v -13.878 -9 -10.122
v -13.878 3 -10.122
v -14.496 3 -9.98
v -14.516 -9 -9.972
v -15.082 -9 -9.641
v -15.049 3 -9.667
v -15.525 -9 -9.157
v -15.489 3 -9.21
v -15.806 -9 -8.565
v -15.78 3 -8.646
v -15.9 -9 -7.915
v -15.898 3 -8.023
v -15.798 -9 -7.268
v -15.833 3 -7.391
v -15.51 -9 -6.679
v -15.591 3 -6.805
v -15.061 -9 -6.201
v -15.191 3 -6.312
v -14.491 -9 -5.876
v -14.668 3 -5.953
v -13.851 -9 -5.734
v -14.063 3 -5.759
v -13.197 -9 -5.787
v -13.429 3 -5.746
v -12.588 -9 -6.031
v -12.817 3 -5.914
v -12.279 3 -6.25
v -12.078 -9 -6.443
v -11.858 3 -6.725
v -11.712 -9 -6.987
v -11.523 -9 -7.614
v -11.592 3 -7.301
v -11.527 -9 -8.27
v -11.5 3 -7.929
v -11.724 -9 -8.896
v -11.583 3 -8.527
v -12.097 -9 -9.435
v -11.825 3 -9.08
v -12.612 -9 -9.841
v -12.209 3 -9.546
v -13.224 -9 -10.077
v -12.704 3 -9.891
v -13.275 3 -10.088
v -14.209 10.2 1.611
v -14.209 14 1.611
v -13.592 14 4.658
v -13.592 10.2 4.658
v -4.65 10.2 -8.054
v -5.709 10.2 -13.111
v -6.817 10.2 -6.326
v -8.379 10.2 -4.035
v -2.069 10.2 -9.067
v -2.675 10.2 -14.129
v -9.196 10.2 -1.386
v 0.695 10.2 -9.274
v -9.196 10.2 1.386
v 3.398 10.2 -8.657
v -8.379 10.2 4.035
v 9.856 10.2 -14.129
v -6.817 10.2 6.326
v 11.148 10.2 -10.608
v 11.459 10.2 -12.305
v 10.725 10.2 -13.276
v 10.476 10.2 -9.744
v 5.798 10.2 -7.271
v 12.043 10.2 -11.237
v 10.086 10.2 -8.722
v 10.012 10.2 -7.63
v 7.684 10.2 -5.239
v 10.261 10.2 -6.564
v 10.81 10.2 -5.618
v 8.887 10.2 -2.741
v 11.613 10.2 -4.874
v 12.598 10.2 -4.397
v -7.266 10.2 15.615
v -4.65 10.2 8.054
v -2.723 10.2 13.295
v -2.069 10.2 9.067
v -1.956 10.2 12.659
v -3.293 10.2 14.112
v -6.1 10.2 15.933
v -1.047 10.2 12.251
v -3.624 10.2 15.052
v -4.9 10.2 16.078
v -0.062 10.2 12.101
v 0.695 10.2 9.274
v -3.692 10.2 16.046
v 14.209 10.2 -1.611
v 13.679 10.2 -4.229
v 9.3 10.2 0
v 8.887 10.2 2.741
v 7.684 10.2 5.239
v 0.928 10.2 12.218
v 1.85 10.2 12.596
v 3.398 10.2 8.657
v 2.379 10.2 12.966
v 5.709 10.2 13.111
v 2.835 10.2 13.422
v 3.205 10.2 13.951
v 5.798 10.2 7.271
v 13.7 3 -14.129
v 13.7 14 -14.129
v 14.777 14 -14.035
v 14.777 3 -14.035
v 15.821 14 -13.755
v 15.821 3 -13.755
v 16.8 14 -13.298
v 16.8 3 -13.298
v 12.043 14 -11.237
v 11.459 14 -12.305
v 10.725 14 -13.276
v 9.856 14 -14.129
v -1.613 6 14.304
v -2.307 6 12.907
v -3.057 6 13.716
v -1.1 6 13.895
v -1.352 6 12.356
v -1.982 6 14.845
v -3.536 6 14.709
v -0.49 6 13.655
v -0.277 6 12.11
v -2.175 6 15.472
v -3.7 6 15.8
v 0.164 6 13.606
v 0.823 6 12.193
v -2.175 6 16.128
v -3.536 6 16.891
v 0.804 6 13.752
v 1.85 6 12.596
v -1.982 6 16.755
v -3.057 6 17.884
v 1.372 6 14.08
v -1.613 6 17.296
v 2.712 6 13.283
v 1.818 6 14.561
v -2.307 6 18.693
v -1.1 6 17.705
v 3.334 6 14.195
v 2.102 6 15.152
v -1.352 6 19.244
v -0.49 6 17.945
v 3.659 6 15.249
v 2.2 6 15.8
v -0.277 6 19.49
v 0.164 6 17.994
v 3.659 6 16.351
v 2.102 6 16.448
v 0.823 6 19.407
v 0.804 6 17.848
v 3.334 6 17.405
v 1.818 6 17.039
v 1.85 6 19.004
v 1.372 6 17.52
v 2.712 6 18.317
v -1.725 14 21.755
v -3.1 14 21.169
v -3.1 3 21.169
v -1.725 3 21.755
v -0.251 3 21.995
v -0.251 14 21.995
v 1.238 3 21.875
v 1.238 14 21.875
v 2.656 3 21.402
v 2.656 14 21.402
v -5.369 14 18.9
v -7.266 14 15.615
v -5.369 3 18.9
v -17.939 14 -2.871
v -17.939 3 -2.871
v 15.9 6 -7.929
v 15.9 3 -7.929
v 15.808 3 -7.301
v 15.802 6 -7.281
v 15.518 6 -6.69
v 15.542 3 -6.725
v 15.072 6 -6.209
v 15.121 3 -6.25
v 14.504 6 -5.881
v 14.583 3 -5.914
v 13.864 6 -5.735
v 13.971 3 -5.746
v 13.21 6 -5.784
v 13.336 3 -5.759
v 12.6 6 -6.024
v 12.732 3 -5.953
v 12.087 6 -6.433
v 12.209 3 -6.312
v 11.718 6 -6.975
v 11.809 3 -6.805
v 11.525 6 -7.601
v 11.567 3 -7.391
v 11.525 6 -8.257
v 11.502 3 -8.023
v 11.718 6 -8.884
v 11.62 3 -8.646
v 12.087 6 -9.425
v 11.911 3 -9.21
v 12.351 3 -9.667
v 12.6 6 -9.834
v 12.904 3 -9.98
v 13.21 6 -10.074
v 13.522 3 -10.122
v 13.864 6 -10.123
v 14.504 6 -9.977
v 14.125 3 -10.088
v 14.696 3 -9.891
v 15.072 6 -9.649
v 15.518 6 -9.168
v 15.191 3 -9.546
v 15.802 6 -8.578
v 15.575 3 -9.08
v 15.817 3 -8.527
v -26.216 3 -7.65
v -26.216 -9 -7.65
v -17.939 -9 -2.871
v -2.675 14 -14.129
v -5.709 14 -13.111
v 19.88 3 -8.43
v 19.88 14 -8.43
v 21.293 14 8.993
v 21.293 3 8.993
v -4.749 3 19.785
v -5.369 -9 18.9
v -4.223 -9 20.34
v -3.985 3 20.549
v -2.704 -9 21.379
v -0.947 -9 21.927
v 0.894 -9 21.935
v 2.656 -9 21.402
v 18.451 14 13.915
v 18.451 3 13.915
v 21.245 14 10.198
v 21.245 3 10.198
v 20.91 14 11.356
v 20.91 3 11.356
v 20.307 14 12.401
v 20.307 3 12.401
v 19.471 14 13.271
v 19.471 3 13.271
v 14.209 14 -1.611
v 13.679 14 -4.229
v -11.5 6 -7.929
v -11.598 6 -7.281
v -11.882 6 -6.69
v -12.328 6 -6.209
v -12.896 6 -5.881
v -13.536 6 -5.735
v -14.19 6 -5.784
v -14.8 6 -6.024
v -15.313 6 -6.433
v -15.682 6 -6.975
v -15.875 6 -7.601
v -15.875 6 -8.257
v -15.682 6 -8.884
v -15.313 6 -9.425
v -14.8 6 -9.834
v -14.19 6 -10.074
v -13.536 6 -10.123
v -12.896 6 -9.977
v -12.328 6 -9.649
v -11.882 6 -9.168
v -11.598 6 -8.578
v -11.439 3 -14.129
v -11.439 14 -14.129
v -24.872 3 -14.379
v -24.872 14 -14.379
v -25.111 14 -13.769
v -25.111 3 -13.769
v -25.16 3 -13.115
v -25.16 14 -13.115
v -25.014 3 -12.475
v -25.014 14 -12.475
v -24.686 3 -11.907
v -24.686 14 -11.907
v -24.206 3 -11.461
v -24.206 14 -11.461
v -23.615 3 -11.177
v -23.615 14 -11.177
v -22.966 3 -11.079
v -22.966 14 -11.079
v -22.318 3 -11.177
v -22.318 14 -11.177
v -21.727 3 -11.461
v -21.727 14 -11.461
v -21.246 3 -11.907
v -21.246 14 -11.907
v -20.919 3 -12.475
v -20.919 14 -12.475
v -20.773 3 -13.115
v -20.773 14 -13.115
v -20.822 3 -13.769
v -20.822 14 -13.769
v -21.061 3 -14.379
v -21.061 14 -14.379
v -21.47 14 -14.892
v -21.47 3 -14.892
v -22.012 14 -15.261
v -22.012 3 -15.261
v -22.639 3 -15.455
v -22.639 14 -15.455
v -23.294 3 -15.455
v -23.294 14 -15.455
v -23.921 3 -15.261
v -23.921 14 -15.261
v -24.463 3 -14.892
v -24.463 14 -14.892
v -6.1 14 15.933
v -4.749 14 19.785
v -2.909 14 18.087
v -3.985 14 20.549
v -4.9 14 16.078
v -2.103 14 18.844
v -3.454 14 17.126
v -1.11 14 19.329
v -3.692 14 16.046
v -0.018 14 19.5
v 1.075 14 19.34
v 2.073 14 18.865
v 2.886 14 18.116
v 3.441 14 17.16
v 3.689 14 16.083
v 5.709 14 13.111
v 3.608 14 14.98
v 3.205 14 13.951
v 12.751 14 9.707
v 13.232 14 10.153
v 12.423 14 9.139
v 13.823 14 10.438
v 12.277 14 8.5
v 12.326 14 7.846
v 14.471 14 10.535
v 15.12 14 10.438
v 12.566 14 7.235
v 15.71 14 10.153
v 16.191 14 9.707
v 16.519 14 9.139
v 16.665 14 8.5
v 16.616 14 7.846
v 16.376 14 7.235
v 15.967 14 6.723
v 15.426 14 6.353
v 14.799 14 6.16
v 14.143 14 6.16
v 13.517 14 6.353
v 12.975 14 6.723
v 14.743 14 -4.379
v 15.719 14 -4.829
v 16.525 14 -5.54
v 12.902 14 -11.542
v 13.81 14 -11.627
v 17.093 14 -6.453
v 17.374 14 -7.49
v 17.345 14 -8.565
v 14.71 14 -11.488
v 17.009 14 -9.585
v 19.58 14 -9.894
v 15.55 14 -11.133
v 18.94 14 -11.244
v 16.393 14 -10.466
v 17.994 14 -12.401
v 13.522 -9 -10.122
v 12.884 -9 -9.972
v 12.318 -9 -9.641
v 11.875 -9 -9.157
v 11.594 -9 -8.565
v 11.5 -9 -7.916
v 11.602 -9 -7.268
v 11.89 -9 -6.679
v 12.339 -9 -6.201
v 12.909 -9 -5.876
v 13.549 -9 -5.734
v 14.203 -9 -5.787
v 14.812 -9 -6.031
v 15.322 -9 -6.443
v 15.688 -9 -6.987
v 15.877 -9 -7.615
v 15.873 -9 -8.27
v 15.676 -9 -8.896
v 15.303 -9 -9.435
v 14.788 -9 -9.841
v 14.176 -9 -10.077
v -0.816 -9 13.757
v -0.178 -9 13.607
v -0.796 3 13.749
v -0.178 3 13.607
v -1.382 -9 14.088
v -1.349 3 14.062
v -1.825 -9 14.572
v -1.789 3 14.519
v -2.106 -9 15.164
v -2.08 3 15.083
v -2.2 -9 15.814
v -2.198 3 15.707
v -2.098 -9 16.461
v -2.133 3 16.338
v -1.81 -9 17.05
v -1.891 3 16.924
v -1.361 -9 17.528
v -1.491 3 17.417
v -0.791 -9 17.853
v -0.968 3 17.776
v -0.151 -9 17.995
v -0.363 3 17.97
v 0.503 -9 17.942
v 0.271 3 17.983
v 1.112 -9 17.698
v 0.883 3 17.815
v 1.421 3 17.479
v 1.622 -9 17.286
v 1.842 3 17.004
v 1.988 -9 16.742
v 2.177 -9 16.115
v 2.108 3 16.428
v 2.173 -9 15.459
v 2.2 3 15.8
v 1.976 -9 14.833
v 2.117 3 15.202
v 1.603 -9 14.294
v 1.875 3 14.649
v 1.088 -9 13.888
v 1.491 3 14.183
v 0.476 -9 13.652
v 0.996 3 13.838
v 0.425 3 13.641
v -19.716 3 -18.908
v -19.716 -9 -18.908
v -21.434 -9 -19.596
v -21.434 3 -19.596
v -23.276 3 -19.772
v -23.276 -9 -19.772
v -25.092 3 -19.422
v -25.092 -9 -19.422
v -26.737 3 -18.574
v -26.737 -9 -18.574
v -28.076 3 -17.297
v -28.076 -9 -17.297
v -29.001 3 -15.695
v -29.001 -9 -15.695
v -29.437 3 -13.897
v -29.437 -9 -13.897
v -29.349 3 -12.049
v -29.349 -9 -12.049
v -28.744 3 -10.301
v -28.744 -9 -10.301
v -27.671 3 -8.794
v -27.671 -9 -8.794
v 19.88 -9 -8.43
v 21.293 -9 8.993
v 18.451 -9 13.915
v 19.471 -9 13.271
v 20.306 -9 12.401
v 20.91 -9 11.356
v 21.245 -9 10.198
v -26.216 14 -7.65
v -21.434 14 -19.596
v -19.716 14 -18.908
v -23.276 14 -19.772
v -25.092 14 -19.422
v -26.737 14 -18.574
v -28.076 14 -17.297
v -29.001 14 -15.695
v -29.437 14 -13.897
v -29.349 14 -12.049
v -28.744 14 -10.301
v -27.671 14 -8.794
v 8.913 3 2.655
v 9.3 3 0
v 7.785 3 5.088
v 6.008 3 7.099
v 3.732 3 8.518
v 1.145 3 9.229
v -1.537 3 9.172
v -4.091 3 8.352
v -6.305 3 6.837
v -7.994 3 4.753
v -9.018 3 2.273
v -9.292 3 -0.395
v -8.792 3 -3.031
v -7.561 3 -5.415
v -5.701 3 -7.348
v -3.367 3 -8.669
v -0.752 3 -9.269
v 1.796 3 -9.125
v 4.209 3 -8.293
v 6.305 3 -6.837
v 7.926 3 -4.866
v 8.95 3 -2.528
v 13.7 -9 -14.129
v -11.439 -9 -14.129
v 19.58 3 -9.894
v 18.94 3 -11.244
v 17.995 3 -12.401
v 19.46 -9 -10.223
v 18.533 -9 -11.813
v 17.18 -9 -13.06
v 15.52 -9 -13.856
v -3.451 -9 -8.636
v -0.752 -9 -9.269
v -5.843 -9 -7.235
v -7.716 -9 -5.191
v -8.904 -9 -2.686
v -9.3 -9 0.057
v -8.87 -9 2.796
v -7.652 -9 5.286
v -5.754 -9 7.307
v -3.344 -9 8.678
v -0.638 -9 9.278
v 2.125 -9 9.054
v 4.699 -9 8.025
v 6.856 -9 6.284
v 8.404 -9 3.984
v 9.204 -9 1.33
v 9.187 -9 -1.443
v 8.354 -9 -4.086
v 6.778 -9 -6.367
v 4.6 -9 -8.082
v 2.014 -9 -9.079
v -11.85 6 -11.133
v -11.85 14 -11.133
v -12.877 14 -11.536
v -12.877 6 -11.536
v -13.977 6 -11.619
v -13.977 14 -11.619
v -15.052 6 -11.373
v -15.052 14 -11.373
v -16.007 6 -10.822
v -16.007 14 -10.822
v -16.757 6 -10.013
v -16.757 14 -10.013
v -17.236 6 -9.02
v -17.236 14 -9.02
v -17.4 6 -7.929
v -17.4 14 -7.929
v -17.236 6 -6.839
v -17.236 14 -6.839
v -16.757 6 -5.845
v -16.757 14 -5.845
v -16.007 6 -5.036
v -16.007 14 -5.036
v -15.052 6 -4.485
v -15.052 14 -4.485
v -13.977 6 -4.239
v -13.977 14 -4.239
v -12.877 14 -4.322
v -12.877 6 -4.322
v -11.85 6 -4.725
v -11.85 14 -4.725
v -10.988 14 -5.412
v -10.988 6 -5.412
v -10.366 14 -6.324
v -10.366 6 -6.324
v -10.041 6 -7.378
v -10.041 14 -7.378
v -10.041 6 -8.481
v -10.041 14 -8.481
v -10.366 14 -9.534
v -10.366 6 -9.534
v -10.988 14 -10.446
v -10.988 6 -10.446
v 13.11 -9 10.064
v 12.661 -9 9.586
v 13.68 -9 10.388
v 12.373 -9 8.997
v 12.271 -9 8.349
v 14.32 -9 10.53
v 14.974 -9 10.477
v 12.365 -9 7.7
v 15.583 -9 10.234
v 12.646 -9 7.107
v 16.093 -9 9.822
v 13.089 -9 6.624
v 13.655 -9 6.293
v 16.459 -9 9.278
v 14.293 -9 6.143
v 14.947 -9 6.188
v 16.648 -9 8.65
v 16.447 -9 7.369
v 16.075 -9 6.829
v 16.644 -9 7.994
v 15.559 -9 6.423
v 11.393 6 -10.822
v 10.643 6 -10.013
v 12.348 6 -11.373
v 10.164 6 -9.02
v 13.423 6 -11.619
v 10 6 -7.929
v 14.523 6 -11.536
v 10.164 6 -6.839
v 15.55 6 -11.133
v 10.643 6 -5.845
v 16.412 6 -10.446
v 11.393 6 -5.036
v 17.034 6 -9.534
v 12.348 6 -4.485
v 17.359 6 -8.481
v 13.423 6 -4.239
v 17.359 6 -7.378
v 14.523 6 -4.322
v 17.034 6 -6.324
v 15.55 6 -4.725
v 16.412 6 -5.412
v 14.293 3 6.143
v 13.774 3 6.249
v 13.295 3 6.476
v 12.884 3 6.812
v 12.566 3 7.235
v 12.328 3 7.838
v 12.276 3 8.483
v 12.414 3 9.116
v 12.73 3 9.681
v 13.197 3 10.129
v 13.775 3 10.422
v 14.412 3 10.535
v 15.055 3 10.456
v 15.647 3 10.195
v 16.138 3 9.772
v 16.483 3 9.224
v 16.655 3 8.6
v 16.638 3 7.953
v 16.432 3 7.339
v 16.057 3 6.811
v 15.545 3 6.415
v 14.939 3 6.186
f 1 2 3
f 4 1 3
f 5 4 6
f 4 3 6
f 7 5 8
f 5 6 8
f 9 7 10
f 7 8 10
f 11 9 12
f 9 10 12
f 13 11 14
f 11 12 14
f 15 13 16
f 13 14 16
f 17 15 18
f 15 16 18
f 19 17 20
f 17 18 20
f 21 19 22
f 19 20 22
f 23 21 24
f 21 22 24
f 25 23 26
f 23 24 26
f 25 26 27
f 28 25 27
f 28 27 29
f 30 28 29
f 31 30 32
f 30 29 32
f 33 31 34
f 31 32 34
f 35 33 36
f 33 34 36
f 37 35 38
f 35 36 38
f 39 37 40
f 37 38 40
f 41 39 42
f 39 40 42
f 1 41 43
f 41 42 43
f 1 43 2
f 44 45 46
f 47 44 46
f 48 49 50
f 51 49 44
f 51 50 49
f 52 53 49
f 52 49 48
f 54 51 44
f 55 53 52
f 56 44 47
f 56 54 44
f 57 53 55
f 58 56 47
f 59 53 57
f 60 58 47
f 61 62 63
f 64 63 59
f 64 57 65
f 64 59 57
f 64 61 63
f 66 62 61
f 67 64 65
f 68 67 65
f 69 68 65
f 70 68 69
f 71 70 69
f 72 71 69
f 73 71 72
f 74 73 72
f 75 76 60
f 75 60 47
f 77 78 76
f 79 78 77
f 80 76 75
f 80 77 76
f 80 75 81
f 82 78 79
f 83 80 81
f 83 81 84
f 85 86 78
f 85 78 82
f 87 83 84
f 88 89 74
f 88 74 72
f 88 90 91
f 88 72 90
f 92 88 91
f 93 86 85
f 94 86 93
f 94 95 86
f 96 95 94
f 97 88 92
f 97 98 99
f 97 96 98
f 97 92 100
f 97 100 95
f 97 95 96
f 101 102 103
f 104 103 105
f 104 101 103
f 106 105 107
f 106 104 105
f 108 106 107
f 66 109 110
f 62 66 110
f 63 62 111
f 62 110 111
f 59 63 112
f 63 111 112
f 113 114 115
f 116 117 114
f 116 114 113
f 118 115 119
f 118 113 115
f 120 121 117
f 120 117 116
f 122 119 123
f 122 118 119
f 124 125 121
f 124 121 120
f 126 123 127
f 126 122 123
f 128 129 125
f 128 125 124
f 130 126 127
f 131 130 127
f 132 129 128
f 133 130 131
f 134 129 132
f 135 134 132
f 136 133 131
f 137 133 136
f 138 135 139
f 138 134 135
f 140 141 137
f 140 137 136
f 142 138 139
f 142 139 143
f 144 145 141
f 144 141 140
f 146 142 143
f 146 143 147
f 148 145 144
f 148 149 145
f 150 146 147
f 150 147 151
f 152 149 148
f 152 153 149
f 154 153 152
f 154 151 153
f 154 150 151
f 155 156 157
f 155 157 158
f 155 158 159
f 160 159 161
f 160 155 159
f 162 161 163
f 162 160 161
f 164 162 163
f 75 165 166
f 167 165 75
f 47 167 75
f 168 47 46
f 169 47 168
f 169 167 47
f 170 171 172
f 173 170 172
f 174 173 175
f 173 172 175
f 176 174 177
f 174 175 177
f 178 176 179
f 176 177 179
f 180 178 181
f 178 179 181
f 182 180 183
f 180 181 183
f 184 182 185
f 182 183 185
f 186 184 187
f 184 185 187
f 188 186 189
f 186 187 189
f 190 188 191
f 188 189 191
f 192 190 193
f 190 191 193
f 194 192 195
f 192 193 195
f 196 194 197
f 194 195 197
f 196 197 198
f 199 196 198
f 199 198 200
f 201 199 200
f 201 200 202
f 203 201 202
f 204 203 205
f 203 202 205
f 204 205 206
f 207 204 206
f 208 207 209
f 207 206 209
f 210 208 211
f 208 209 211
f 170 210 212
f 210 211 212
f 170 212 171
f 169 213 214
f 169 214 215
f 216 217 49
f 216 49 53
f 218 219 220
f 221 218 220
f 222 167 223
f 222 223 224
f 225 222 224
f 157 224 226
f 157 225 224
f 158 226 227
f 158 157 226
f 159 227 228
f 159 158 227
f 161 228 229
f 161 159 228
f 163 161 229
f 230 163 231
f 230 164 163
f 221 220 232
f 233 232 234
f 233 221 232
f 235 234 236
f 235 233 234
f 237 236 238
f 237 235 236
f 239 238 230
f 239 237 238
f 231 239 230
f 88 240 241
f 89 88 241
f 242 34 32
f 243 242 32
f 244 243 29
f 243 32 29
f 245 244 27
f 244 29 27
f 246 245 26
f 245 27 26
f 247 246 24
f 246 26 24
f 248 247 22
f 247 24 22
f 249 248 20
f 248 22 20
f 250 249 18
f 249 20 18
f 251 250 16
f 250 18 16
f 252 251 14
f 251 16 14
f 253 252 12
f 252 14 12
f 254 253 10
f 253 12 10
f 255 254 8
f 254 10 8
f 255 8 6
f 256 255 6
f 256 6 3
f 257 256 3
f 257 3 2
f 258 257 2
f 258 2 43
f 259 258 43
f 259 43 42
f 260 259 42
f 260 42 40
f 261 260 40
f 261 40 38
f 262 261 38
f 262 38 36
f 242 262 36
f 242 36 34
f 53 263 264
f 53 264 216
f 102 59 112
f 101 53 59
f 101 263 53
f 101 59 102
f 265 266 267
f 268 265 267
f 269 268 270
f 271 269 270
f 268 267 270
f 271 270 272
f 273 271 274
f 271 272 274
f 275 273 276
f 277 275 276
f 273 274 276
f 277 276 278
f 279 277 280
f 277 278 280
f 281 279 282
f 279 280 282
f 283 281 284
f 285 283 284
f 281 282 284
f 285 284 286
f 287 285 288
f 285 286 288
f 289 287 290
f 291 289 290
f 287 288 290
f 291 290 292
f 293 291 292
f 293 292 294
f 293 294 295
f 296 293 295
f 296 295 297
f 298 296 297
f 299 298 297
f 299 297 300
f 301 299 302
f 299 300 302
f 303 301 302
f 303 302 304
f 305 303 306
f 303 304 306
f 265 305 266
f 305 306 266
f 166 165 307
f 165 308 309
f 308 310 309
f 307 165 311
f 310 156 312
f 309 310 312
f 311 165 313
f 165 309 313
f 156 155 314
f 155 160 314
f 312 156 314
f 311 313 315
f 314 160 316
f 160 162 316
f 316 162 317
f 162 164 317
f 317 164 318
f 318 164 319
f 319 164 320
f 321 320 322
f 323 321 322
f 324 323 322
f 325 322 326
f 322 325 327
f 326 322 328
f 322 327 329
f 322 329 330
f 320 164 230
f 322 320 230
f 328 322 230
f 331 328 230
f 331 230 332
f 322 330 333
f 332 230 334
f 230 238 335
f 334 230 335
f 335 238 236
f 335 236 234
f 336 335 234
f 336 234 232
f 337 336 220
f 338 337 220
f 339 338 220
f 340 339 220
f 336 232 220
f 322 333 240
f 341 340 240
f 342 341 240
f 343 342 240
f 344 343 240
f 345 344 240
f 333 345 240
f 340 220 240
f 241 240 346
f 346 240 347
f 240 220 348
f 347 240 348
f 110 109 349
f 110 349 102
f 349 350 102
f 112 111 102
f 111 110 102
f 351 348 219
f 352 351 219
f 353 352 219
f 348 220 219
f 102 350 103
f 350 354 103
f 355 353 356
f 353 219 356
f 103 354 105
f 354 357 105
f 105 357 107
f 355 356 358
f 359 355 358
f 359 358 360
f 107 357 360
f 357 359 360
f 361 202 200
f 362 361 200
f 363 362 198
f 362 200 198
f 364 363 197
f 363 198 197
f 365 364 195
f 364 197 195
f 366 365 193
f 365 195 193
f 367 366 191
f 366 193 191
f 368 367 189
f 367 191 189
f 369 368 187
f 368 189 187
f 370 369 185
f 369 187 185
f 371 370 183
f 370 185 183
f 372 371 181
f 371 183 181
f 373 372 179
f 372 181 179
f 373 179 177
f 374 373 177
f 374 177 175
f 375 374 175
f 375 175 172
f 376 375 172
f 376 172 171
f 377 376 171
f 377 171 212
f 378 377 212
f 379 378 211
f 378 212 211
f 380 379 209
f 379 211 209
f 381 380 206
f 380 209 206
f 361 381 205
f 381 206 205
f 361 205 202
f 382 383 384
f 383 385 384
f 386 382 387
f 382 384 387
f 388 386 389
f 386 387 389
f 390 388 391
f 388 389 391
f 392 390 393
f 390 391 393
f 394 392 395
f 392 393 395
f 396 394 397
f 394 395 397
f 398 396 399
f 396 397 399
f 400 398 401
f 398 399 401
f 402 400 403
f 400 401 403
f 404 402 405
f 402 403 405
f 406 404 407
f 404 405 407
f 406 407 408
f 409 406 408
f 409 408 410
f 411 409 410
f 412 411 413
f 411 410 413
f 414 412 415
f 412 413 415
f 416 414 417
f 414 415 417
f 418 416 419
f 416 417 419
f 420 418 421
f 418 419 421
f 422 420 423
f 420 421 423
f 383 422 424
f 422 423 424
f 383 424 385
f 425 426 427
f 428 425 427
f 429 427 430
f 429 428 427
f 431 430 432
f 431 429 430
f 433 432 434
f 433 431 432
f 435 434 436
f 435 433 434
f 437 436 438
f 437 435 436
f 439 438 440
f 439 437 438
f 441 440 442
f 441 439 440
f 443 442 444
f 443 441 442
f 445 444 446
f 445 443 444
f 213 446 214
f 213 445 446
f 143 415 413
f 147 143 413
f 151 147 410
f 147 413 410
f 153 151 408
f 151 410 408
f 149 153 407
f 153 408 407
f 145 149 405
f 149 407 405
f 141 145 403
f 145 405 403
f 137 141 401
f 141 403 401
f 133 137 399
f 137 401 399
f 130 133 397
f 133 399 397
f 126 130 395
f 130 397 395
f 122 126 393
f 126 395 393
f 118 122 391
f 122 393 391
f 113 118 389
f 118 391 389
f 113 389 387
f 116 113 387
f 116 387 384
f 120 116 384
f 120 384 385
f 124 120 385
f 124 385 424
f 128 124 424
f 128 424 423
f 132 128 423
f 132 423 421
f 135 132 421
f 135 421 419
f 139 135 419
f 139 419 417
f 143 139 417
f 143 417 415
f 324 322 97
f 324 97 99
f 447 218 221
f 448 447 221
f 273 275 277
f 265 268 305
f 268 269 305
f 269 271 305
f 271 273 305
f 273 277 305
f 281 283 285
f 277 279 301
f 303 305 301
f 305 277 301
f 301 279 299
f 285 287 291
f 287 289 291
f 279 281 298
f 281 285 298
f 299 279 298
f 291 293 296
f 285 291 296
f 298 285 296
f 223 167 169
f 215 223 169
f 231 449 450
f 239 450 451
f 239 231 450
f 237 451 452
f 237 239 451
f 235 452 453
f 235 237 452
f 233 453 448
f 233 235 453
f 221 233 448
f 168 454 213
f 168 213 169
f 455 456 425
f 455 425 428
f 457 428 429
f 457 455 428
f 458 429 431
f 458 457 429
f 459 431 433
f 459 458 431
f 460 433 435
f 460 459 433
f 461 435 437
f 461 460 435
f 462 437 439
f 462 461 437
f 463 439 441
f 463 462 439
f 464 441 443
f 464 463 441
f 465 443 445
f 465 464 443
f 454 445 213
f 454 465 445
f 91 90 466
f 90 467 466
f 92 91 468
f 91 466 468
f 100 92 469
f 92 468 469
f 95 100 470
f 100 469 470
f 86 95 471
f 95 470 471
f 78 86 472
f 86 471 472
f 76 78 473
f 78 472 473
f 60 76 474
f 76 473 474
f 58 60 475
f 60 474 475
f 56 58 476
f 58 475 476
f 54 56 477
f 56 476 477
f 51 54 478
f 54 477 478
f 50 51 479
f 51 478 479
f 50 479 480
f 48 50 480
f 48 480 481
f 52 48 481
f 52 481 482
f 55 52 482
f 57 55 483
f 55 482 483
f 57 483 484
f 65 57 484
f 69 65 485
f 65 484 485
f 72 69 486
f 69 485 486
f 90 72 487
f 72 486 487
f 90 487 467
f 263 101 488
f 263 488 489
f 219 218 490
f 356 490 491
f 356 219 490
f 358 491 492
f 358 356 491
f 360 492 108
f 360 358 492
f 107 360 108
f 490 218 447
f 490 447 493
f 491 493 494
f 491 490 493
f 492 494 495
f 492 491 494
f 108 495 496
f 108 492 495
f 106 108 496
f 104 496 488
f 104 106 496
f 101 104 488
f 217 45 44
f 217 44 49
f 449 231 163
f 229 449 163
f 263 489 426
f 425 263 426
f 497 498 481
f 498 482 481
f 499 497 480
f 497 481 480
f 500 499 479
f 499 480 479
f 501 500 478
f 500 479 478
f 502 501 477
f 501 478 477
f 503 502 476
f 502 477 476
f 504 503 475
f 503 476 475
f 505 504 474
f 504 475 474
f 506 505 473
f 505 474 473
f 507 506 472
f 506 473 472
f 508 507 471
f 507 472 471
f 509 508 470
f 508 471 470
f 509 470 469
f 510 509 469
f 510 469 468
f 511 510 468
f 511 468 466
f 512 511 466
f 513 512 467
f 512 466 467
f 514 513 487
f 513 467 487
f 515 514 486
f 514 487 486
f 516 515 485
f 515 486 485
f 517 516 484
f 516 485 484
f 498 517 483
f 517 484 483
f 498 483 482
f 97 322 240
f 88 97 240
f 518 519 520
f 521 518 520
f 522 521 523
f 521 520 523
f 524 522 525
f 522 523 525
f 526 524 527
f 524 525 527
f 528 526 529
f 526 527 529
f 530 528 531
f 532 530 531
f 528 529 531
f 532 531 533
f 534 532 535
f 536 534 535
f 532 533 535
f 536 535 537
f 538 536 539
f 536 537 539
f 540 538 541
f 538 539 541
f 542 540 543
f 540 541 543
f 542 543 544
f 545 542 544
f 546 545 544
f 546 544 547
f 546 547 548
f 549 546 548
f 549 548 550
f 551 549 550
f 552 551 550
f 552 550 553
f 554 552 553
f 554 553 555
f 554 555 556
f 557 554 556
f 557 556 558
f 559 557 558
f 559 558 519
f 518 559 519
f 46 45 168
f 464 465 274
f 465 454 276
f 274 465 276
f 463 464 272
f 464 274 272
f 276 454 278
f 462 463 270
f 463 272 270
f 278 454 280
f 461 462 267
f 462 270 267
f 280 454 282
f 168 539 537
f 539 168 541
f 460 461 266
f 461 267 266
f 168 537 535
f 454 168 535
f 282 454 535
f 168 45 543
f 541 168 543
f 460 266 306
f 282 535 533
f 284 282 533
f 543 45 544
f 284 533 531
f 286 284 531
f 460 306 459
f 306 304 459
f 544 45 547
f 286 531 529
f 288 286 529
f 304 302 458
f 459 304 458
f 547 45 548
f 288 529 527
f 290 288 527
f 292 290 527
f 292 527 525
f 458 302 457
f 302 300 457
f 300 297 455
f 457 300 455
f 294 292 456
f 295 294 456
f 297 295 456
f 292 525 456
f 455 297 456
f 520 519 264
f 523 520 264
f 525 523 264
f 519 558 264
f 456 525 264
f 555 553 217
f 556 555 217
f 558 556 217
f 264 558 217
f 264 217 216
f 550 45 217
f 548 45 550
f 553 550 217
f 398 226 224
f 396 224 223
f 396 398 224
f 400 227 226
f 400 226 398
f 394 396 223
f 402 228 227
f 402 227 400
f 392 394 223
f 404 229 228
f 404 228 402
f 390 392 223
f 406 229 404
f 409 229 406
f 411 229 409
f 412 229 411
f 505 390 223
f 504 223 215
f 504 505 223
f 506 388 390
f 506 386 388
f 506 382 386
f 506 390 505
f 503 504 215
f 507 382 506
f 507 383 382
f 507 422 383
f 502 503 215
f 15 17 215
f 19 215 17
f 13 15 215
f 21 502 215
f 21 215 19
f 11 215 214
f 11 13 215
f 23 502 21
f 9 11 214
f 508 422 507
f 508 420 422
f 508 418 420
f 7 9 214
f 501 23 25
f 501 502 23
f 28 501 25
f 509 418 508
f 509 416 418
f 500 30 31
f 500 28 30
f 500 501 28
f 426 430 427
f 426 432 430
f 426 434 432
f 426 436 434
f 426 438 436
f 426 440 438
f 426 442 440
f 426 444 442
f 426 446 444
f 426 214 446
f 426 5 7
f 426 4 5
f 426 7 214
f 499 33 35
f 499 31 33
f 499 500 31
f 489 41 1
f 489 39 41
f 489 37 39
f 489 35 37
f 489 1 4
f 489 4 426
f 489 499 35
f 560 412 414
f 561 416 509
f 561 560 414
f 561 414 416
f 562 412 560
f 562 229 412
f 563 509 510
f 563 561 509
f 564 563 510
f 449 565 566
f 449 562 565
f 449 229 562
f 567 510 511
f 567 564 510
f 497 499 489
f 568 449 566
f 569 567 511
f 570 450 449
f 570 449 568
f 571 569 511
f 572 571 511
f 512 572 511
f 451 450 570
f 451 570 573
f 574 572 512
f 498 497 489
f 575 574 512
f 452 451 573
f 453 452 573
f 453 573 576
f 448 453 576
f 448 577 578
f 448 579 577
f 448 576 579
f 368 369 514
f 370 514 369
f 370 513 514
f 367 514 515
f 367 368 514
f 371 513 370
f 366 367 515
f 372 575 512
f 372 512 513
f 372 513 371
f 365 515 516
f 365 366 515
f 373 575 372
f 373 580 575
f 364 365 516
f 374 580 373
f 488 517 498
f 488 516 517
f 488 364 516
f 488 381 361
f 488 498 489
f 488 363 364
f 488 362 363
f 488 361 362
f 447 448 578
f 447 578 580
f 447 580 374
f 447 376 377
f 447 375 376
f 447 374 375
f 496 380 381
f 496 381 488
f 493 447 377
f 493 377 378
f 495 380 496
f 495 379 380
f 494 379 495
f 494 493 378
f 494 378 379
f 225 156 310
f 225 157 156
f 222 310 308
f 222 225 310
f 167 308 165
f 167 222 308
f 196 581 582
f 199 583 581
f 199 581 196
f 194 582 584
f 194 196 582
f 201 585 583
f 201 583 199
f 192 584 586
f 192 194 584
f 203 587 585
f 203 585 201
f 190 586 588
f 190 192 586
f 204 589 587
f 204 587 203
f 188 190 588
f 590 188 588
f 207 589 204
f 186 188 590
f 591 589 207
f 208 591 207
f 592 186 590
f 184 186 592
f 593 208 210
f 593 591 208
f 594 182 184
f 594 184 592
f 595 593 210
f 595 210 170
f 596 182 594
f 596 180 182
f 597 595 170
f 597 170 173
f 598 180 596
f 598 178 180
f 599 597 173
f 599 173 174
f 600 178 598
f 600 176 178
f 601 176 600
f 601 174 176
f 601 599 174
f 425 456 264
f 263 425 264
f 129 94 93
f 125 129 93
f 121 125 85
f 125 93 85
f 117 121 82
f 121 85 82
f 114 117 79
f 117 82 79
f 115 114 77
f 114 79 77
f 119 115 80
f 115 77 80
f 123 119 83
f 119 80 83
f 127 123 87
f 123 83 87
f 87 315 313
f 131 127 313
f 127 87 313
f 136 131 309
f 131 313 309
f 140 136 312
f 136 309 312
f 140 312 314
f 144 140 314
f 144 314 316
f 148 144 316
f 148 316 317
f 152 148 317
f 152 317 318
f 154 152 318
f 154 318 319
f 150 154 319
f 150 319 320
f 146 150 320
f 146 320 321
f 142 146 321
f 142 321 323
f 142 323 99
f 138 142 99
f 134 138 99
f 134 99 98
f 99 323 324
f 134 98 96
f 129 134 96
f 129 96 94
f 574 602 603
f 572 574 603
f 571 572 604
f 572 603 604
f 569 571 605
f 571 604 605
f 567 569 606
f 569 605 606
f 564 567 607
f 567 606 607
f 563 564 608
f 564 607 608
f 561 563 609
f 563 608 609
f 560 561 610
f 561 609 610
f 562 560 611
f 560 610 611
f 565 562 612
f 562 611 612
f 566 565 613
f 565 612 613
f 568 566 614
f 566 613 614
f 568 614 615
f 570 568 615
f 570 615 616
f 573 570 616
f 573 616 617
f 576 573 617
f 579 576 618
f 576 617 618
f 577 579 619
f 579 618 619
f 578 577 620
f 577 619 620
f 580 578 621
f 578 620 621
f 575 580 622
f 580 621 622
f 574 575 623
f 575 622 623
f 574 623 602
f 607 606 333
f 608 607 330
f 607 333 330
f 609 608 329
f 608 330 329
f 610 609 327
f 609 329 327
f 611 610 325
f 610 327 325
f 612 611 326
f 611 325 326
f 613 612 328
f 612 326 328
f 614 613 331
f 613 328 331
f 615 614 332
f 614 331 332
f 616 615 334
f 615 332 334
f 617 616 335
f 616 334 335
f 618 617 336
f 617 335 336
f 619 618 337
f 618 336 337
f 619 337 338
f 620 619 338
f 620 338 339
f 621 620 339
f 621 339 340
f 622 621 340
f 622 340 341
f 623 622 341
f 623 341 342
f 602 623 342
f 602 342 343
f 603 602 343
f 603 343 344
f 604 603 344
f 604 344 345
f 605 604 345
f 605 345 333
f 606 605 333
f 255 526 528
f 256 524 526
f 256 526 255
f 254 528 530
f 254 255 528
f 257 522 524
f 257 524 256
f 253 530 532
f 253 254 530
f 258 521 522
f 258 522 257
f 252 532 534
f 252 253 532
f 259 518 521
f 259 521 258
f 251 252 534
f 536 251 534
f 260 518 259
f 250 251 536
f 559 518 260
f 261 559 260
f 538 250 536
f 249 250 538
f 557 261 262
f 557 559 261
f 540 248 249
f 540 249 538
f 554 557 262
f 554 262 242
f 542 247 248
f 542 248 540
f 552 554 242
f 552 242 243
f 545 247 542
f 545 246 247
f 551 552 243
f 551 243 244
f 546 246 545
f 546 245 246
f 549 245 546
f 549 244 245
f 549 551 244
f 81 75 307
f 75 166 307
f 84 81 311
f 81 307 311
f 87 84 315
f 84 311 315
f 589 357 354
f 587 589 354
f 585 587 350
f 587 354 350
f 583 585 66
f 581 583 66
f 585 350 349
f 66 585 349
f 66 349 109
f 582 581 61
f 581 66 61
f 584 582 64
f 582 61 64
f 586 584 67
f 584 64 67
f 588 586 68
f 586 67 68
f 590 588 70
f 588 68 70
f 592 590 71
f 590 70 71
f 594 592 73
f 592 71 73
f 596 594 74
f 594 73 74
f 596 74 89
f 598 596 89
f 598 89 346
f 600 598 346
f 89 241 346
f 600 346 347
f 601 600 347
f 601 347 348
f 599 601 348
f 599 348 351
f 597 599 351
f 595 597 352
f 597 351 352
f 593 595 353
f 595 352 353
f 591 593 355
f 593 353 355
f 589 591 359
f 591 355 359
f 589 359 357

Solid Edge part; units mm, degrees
sketch "Sketch1" plane through (0, 0, 0) normal (0, -1, 0) x (1, 0, 0)
  line L0 (-5.3694, 18.9) -> (-19.0694, -4.8291)
  arc A0 (-13.7, -14.1291) -> (-19.0694, -4.8291) centre (-13.7, -7.9291) cw
  line L1 (-13.7, -14.1291) -> (13.7, -14.1291)
  arc A1 (19.0694, -4.8291) -> (13.7, -14.1291) centre (13.7, -7.9291) cw
  line L2 (5.3694, 18.9) -> (19.0694, -4.8291)
  arc A2 (-5.3694, 18.9) -> (5.3694, 18.9) centre (0, 15.8) cw
  dimension "D1" = 5.3694
extrude "Protrusion1" add sketch "Sketch1" against normal blind 14
sketch "Sketch2" plane through (0, 0, 0) normal (0, -1, 0) x (1, 0, 0)
  circle A0 centre (-13.7, -7.9291) radius 2.2
  circle A1 centre (13.7, -7.9291) radius 2.2
  circle A2 centre (0, 15.8) radius 2.2
  dimension "D1" = 37.2
  dimension "D2" = 4
  dimension "D3" = 4.4
  dimension "D4" = 6.2
  dimension "D5" = 6.2
  dimension "D6" = 4.4
  dimension "D7" = 6.2
  dimension "D8" = 27.4
  dimension "D9" = 27.4
  dimension "D10" = 27.4
extrude "Cutout1" cut sketch "Sketch2" against normal blind 457.8755
sketch "Sketch3" plane through (0, 0, 0) normal (0, -1, 0) x (1, 0, 0)
  circle A0 centre (0, 0) radius 9.3
extrude "Cutout2" cut sketch "Sketch3" against normal blind 434.4917
sketch "Sketch4" plane through (0, 0, 3.9355) normal (0, -1, 0) x (-0.5, 0, 0.8660254)
  line L0 (-23.325, -5.9323) -> (-23.325, -18.9323)
  line L1 (-23.325, -18.9323) -> (16.475, -18.9323)
  line L2 (16.475, -18.9323) -> (16.475, -5.9323)
  line L3 (12.7755, -8.7037) -> (16.475, -5.9323)
  line L4 (-20.9306, -8.7037) -> (12.7755, -8.7037)
  line L5 (-20.9306, -5.9323) -> (-20.9306, -8.7037)
  line L6 (-23.325, -5.9323) -> (-20.9306, -5.9323)
  dimension "D1" = 13
extrude "Protrusion2" add sketch "Sketch4" against normal up to vertex (14 mm away)
sketch "Sketch5" plane through (18.1083, 8, 10.4355) normal (0.8660254, 0, 0.5) x (-0.5, 0, 0.8660254)
  line L0 (-19.9, 8) -> (19.9, 8)
  line L1 (19.9, -6) -> (19.9, 8)
  line L2 (-19.9, -6) -> (19.9, -6)
  line L3 (-19.9, -6) -> (-19.9, 8)
extrude "ExtrudedProtrusion_14" add sketch "Sketch5" along normal blind 4
sketch "Sketch6" plane through (5.8112, 14, 7.7701) normal (0, 1, 0) x (0.5, 0, -0.8660254)
  circle A0 centre (3.8403, 24.7468) radius 3.7
  circle A1 centre (17.5403, 1.0177) radius 3.7
  circle A2 centre (-9.8597, 1.0177) radius 3.7
extrude "Cutout3" cut sketch "Sketch6" against normal blind 8
sketch "Sketch7" plane through (11.8615, 14, 7.7701) normal (0, 1, 0) x (-0.8660254, 0, -0.5)
  circle A0 centre (-2.5426, -0.8152) radius 2.2
  dimension "D1" = 6
  dimension "D2" = 39.8
  dimension "D3" = 19.9
  dimension "D4" = 4.4
extrude "ExtrudedCutout_23" cut sketch "Sketch7" against normal blind 166.5817
sketch "Sketch8" plane through (11.8615, 14, 7.7701) normal (0, 1, 0) x (-0.8660254, 0, -0.5)
  circle A0 centre (40.6865, -0.8152) radius 2.2
  line L0 (40.6865, 5.6848) -> (31.1282, 5.6848)
  line L1 (31.1282, 5.6848) -> (31.1282, 3.8832)
  line L2 (31.1282, 3.8832) -> (34.2429, 1.8592)
  line L3 (34.2429, 1.8592) -> (34.2429, -2.6486)
  line L4 (31.1282, -7.3152) -> (34.2429, -2.6486)
  line L5 (40.6865, -7.3152) -> (31.1282, -7.3152)
  arc A1 (40.6865, -7.3152) -> (40.6865, 5.6848) centre (40.6865, -0.8152) ccw
extrude "Protrusion3" add sketch "Sketch8" against normal up to vertex (14 mm away)
sketch "Sketch9" plane through (11.8615, 14, 7.7701) normal (0, 1, 0) x (-0.8660254, 0, -0.5)
  line L0 (-10.7426, -0.8152) -> (-10.7426, -20.7152)
  line L1 (-10.7426, -20.7152) -> (6.2574, -20.7152)
  arc A0 (1.1563, -18.0392) -> (6.2574, -20.7152) centre (6.2574, -14.5152) ccw
  line L2 (1.1563, -18.0392) -> (-10.7426, -0.8152)
extrude "Cutout4" cut sketch "Sketch9" against normal blind 85.4791
sketch "Sketch10" plane through (6.8865, 14, 7.7701) normal (0, 1, 0) x (-0.8660254, 0, -0.5)
  line L0 (-15.0511, 16.5973) -> (-15.0511, -3.3027)
  line L1 (-3.1522, 13.9213) -> (-15.0511, -3.3027)
  arc A0 (1.9489, 16.5973) -> (-3.1522, 13.9213) centre (1.9489, 10.3973) ccw
  line L2 (1.9489, 16.5973) -> (-15.0511, 16.5973)
extrude "ExtrudedCutout_27" cut sketch "Sketch10" against normal blind 118.3722
sketch "Sketch11" plane through (0, 0, 0) normal (0, 0, 1) x (1, 0, 0)
  line L0 (-57, 0) -> (32.4619, 0)
  line L1 (32.4619, 0) -> (32.4619, 3)
  line L2 (32.4619, 3) -> (-57, 3)
  line L3 (-57, 3) -> (-57, 0)
  dimension "D1" = 3
extrude "Cutout5" cut sketch "Sketch11" along normal mid plane 82.8276
sketch "Sketch12" plane through (11.8615, 14, 7.7701) normal (0, 1, 0) x (-0.8660254, 0, -0.5)
  line L0 (2.6574, 7.7016) -> (2.6574, -9.2984)
  line L1 (2.6574, -9.2984) -> (7.9574, -15.2984)
  arc A0 (20.3574, -15.2984) -> (7.9574, -15.2984) centre (14.1574, -9.8217) cw
  line L2 (25.6574, -9.2984) -> (20.3574, -15.2984)
  line L3 (25.6574, 7.7016) -> (25.6574, -9.2984)
  line L4 (25.6574, 7.7016) -> (20.3574, 13.7016)
  arc A1 (7.9574, 13.7016) -> (20.3574, 13.7016) centre (14.1574, 8.2249) cw
  line L5 (2.6574, 7.7016) -> (7.9574, 13.7016)
  dimension "D1" = 11.5
  dimension "D2" = 11.5
  dimension "D3" = 6.2
  dimension "D4" = 6.2
  dimension "D5" = 8.5
  dimension "D6" = 8.5
  dimension "D7" = 8.5
  dimension "D8" = 8.5
  dimension "D9" = 6
  dimension "D10" = 6
  dimension "D11" = 6
  dimension "D12" = 6
extrude "Cutout6" cut sketch "Sketch12" against normal blind 3.8
fillet "Round_2" radius 5 1 edges at (21.5724, 8.5, 12.4355)
sketch "Sketch13" plane through (-4.0785, 3, 1.1105) normal (0, -1, 0) x (-0.0808589, 0, -0.9967256)
  line L0 (-14.5843, 21.4205) -> (-20.7701, 5.0713)
  arc A0 (-17.6269, -2.7251) -> (-20.7701, 5.0713) centre (-14.9712, 2.8773) cw
  line L1 (-17.6269, -2.7251) -> (5.0889, -13.4929)
  line L2 (10.5218, -21.3571) -> (5.0889, -13.4929)
  arc A1 (21.2176, -13.9681) -> (10.5218, -21.3571) centre (15.8697, -17.6626) cw
  line L3 (15.7848, -6.1039) -> (21.2176, -13.9681)
  line L4 (13.7521, 18.9525) -> (15.7848, -6.1039)
  arc A2 (7.5724, 24.6512) -> (13.7521, 18.9525) centre (7.5724, 18.4512) cw
  line L5 (7.5724, 24.6512) -> (-9.9079, 24.6512)
  arc A3 (-14.5843, 21.4205) -> (-9.9079, 24.6512) centre (-9.9079, 19.6512) cw
  circle A4 centre (7.5724, 18.4512) radius 2.2
  circle A5 centre (-8.7012, 17.9046) radius 2.2
  circle A6 centre (-14.9712, 2.8773) radius 2.2
  circle A7 centre (0.777, 4.1549) radius 9.3
  circle A8 centre (9.7879, -8.8591) radius 2.2
extrude "ExtrudedProtrusion_16" add sketch "Sketch13" along normal blind 12
